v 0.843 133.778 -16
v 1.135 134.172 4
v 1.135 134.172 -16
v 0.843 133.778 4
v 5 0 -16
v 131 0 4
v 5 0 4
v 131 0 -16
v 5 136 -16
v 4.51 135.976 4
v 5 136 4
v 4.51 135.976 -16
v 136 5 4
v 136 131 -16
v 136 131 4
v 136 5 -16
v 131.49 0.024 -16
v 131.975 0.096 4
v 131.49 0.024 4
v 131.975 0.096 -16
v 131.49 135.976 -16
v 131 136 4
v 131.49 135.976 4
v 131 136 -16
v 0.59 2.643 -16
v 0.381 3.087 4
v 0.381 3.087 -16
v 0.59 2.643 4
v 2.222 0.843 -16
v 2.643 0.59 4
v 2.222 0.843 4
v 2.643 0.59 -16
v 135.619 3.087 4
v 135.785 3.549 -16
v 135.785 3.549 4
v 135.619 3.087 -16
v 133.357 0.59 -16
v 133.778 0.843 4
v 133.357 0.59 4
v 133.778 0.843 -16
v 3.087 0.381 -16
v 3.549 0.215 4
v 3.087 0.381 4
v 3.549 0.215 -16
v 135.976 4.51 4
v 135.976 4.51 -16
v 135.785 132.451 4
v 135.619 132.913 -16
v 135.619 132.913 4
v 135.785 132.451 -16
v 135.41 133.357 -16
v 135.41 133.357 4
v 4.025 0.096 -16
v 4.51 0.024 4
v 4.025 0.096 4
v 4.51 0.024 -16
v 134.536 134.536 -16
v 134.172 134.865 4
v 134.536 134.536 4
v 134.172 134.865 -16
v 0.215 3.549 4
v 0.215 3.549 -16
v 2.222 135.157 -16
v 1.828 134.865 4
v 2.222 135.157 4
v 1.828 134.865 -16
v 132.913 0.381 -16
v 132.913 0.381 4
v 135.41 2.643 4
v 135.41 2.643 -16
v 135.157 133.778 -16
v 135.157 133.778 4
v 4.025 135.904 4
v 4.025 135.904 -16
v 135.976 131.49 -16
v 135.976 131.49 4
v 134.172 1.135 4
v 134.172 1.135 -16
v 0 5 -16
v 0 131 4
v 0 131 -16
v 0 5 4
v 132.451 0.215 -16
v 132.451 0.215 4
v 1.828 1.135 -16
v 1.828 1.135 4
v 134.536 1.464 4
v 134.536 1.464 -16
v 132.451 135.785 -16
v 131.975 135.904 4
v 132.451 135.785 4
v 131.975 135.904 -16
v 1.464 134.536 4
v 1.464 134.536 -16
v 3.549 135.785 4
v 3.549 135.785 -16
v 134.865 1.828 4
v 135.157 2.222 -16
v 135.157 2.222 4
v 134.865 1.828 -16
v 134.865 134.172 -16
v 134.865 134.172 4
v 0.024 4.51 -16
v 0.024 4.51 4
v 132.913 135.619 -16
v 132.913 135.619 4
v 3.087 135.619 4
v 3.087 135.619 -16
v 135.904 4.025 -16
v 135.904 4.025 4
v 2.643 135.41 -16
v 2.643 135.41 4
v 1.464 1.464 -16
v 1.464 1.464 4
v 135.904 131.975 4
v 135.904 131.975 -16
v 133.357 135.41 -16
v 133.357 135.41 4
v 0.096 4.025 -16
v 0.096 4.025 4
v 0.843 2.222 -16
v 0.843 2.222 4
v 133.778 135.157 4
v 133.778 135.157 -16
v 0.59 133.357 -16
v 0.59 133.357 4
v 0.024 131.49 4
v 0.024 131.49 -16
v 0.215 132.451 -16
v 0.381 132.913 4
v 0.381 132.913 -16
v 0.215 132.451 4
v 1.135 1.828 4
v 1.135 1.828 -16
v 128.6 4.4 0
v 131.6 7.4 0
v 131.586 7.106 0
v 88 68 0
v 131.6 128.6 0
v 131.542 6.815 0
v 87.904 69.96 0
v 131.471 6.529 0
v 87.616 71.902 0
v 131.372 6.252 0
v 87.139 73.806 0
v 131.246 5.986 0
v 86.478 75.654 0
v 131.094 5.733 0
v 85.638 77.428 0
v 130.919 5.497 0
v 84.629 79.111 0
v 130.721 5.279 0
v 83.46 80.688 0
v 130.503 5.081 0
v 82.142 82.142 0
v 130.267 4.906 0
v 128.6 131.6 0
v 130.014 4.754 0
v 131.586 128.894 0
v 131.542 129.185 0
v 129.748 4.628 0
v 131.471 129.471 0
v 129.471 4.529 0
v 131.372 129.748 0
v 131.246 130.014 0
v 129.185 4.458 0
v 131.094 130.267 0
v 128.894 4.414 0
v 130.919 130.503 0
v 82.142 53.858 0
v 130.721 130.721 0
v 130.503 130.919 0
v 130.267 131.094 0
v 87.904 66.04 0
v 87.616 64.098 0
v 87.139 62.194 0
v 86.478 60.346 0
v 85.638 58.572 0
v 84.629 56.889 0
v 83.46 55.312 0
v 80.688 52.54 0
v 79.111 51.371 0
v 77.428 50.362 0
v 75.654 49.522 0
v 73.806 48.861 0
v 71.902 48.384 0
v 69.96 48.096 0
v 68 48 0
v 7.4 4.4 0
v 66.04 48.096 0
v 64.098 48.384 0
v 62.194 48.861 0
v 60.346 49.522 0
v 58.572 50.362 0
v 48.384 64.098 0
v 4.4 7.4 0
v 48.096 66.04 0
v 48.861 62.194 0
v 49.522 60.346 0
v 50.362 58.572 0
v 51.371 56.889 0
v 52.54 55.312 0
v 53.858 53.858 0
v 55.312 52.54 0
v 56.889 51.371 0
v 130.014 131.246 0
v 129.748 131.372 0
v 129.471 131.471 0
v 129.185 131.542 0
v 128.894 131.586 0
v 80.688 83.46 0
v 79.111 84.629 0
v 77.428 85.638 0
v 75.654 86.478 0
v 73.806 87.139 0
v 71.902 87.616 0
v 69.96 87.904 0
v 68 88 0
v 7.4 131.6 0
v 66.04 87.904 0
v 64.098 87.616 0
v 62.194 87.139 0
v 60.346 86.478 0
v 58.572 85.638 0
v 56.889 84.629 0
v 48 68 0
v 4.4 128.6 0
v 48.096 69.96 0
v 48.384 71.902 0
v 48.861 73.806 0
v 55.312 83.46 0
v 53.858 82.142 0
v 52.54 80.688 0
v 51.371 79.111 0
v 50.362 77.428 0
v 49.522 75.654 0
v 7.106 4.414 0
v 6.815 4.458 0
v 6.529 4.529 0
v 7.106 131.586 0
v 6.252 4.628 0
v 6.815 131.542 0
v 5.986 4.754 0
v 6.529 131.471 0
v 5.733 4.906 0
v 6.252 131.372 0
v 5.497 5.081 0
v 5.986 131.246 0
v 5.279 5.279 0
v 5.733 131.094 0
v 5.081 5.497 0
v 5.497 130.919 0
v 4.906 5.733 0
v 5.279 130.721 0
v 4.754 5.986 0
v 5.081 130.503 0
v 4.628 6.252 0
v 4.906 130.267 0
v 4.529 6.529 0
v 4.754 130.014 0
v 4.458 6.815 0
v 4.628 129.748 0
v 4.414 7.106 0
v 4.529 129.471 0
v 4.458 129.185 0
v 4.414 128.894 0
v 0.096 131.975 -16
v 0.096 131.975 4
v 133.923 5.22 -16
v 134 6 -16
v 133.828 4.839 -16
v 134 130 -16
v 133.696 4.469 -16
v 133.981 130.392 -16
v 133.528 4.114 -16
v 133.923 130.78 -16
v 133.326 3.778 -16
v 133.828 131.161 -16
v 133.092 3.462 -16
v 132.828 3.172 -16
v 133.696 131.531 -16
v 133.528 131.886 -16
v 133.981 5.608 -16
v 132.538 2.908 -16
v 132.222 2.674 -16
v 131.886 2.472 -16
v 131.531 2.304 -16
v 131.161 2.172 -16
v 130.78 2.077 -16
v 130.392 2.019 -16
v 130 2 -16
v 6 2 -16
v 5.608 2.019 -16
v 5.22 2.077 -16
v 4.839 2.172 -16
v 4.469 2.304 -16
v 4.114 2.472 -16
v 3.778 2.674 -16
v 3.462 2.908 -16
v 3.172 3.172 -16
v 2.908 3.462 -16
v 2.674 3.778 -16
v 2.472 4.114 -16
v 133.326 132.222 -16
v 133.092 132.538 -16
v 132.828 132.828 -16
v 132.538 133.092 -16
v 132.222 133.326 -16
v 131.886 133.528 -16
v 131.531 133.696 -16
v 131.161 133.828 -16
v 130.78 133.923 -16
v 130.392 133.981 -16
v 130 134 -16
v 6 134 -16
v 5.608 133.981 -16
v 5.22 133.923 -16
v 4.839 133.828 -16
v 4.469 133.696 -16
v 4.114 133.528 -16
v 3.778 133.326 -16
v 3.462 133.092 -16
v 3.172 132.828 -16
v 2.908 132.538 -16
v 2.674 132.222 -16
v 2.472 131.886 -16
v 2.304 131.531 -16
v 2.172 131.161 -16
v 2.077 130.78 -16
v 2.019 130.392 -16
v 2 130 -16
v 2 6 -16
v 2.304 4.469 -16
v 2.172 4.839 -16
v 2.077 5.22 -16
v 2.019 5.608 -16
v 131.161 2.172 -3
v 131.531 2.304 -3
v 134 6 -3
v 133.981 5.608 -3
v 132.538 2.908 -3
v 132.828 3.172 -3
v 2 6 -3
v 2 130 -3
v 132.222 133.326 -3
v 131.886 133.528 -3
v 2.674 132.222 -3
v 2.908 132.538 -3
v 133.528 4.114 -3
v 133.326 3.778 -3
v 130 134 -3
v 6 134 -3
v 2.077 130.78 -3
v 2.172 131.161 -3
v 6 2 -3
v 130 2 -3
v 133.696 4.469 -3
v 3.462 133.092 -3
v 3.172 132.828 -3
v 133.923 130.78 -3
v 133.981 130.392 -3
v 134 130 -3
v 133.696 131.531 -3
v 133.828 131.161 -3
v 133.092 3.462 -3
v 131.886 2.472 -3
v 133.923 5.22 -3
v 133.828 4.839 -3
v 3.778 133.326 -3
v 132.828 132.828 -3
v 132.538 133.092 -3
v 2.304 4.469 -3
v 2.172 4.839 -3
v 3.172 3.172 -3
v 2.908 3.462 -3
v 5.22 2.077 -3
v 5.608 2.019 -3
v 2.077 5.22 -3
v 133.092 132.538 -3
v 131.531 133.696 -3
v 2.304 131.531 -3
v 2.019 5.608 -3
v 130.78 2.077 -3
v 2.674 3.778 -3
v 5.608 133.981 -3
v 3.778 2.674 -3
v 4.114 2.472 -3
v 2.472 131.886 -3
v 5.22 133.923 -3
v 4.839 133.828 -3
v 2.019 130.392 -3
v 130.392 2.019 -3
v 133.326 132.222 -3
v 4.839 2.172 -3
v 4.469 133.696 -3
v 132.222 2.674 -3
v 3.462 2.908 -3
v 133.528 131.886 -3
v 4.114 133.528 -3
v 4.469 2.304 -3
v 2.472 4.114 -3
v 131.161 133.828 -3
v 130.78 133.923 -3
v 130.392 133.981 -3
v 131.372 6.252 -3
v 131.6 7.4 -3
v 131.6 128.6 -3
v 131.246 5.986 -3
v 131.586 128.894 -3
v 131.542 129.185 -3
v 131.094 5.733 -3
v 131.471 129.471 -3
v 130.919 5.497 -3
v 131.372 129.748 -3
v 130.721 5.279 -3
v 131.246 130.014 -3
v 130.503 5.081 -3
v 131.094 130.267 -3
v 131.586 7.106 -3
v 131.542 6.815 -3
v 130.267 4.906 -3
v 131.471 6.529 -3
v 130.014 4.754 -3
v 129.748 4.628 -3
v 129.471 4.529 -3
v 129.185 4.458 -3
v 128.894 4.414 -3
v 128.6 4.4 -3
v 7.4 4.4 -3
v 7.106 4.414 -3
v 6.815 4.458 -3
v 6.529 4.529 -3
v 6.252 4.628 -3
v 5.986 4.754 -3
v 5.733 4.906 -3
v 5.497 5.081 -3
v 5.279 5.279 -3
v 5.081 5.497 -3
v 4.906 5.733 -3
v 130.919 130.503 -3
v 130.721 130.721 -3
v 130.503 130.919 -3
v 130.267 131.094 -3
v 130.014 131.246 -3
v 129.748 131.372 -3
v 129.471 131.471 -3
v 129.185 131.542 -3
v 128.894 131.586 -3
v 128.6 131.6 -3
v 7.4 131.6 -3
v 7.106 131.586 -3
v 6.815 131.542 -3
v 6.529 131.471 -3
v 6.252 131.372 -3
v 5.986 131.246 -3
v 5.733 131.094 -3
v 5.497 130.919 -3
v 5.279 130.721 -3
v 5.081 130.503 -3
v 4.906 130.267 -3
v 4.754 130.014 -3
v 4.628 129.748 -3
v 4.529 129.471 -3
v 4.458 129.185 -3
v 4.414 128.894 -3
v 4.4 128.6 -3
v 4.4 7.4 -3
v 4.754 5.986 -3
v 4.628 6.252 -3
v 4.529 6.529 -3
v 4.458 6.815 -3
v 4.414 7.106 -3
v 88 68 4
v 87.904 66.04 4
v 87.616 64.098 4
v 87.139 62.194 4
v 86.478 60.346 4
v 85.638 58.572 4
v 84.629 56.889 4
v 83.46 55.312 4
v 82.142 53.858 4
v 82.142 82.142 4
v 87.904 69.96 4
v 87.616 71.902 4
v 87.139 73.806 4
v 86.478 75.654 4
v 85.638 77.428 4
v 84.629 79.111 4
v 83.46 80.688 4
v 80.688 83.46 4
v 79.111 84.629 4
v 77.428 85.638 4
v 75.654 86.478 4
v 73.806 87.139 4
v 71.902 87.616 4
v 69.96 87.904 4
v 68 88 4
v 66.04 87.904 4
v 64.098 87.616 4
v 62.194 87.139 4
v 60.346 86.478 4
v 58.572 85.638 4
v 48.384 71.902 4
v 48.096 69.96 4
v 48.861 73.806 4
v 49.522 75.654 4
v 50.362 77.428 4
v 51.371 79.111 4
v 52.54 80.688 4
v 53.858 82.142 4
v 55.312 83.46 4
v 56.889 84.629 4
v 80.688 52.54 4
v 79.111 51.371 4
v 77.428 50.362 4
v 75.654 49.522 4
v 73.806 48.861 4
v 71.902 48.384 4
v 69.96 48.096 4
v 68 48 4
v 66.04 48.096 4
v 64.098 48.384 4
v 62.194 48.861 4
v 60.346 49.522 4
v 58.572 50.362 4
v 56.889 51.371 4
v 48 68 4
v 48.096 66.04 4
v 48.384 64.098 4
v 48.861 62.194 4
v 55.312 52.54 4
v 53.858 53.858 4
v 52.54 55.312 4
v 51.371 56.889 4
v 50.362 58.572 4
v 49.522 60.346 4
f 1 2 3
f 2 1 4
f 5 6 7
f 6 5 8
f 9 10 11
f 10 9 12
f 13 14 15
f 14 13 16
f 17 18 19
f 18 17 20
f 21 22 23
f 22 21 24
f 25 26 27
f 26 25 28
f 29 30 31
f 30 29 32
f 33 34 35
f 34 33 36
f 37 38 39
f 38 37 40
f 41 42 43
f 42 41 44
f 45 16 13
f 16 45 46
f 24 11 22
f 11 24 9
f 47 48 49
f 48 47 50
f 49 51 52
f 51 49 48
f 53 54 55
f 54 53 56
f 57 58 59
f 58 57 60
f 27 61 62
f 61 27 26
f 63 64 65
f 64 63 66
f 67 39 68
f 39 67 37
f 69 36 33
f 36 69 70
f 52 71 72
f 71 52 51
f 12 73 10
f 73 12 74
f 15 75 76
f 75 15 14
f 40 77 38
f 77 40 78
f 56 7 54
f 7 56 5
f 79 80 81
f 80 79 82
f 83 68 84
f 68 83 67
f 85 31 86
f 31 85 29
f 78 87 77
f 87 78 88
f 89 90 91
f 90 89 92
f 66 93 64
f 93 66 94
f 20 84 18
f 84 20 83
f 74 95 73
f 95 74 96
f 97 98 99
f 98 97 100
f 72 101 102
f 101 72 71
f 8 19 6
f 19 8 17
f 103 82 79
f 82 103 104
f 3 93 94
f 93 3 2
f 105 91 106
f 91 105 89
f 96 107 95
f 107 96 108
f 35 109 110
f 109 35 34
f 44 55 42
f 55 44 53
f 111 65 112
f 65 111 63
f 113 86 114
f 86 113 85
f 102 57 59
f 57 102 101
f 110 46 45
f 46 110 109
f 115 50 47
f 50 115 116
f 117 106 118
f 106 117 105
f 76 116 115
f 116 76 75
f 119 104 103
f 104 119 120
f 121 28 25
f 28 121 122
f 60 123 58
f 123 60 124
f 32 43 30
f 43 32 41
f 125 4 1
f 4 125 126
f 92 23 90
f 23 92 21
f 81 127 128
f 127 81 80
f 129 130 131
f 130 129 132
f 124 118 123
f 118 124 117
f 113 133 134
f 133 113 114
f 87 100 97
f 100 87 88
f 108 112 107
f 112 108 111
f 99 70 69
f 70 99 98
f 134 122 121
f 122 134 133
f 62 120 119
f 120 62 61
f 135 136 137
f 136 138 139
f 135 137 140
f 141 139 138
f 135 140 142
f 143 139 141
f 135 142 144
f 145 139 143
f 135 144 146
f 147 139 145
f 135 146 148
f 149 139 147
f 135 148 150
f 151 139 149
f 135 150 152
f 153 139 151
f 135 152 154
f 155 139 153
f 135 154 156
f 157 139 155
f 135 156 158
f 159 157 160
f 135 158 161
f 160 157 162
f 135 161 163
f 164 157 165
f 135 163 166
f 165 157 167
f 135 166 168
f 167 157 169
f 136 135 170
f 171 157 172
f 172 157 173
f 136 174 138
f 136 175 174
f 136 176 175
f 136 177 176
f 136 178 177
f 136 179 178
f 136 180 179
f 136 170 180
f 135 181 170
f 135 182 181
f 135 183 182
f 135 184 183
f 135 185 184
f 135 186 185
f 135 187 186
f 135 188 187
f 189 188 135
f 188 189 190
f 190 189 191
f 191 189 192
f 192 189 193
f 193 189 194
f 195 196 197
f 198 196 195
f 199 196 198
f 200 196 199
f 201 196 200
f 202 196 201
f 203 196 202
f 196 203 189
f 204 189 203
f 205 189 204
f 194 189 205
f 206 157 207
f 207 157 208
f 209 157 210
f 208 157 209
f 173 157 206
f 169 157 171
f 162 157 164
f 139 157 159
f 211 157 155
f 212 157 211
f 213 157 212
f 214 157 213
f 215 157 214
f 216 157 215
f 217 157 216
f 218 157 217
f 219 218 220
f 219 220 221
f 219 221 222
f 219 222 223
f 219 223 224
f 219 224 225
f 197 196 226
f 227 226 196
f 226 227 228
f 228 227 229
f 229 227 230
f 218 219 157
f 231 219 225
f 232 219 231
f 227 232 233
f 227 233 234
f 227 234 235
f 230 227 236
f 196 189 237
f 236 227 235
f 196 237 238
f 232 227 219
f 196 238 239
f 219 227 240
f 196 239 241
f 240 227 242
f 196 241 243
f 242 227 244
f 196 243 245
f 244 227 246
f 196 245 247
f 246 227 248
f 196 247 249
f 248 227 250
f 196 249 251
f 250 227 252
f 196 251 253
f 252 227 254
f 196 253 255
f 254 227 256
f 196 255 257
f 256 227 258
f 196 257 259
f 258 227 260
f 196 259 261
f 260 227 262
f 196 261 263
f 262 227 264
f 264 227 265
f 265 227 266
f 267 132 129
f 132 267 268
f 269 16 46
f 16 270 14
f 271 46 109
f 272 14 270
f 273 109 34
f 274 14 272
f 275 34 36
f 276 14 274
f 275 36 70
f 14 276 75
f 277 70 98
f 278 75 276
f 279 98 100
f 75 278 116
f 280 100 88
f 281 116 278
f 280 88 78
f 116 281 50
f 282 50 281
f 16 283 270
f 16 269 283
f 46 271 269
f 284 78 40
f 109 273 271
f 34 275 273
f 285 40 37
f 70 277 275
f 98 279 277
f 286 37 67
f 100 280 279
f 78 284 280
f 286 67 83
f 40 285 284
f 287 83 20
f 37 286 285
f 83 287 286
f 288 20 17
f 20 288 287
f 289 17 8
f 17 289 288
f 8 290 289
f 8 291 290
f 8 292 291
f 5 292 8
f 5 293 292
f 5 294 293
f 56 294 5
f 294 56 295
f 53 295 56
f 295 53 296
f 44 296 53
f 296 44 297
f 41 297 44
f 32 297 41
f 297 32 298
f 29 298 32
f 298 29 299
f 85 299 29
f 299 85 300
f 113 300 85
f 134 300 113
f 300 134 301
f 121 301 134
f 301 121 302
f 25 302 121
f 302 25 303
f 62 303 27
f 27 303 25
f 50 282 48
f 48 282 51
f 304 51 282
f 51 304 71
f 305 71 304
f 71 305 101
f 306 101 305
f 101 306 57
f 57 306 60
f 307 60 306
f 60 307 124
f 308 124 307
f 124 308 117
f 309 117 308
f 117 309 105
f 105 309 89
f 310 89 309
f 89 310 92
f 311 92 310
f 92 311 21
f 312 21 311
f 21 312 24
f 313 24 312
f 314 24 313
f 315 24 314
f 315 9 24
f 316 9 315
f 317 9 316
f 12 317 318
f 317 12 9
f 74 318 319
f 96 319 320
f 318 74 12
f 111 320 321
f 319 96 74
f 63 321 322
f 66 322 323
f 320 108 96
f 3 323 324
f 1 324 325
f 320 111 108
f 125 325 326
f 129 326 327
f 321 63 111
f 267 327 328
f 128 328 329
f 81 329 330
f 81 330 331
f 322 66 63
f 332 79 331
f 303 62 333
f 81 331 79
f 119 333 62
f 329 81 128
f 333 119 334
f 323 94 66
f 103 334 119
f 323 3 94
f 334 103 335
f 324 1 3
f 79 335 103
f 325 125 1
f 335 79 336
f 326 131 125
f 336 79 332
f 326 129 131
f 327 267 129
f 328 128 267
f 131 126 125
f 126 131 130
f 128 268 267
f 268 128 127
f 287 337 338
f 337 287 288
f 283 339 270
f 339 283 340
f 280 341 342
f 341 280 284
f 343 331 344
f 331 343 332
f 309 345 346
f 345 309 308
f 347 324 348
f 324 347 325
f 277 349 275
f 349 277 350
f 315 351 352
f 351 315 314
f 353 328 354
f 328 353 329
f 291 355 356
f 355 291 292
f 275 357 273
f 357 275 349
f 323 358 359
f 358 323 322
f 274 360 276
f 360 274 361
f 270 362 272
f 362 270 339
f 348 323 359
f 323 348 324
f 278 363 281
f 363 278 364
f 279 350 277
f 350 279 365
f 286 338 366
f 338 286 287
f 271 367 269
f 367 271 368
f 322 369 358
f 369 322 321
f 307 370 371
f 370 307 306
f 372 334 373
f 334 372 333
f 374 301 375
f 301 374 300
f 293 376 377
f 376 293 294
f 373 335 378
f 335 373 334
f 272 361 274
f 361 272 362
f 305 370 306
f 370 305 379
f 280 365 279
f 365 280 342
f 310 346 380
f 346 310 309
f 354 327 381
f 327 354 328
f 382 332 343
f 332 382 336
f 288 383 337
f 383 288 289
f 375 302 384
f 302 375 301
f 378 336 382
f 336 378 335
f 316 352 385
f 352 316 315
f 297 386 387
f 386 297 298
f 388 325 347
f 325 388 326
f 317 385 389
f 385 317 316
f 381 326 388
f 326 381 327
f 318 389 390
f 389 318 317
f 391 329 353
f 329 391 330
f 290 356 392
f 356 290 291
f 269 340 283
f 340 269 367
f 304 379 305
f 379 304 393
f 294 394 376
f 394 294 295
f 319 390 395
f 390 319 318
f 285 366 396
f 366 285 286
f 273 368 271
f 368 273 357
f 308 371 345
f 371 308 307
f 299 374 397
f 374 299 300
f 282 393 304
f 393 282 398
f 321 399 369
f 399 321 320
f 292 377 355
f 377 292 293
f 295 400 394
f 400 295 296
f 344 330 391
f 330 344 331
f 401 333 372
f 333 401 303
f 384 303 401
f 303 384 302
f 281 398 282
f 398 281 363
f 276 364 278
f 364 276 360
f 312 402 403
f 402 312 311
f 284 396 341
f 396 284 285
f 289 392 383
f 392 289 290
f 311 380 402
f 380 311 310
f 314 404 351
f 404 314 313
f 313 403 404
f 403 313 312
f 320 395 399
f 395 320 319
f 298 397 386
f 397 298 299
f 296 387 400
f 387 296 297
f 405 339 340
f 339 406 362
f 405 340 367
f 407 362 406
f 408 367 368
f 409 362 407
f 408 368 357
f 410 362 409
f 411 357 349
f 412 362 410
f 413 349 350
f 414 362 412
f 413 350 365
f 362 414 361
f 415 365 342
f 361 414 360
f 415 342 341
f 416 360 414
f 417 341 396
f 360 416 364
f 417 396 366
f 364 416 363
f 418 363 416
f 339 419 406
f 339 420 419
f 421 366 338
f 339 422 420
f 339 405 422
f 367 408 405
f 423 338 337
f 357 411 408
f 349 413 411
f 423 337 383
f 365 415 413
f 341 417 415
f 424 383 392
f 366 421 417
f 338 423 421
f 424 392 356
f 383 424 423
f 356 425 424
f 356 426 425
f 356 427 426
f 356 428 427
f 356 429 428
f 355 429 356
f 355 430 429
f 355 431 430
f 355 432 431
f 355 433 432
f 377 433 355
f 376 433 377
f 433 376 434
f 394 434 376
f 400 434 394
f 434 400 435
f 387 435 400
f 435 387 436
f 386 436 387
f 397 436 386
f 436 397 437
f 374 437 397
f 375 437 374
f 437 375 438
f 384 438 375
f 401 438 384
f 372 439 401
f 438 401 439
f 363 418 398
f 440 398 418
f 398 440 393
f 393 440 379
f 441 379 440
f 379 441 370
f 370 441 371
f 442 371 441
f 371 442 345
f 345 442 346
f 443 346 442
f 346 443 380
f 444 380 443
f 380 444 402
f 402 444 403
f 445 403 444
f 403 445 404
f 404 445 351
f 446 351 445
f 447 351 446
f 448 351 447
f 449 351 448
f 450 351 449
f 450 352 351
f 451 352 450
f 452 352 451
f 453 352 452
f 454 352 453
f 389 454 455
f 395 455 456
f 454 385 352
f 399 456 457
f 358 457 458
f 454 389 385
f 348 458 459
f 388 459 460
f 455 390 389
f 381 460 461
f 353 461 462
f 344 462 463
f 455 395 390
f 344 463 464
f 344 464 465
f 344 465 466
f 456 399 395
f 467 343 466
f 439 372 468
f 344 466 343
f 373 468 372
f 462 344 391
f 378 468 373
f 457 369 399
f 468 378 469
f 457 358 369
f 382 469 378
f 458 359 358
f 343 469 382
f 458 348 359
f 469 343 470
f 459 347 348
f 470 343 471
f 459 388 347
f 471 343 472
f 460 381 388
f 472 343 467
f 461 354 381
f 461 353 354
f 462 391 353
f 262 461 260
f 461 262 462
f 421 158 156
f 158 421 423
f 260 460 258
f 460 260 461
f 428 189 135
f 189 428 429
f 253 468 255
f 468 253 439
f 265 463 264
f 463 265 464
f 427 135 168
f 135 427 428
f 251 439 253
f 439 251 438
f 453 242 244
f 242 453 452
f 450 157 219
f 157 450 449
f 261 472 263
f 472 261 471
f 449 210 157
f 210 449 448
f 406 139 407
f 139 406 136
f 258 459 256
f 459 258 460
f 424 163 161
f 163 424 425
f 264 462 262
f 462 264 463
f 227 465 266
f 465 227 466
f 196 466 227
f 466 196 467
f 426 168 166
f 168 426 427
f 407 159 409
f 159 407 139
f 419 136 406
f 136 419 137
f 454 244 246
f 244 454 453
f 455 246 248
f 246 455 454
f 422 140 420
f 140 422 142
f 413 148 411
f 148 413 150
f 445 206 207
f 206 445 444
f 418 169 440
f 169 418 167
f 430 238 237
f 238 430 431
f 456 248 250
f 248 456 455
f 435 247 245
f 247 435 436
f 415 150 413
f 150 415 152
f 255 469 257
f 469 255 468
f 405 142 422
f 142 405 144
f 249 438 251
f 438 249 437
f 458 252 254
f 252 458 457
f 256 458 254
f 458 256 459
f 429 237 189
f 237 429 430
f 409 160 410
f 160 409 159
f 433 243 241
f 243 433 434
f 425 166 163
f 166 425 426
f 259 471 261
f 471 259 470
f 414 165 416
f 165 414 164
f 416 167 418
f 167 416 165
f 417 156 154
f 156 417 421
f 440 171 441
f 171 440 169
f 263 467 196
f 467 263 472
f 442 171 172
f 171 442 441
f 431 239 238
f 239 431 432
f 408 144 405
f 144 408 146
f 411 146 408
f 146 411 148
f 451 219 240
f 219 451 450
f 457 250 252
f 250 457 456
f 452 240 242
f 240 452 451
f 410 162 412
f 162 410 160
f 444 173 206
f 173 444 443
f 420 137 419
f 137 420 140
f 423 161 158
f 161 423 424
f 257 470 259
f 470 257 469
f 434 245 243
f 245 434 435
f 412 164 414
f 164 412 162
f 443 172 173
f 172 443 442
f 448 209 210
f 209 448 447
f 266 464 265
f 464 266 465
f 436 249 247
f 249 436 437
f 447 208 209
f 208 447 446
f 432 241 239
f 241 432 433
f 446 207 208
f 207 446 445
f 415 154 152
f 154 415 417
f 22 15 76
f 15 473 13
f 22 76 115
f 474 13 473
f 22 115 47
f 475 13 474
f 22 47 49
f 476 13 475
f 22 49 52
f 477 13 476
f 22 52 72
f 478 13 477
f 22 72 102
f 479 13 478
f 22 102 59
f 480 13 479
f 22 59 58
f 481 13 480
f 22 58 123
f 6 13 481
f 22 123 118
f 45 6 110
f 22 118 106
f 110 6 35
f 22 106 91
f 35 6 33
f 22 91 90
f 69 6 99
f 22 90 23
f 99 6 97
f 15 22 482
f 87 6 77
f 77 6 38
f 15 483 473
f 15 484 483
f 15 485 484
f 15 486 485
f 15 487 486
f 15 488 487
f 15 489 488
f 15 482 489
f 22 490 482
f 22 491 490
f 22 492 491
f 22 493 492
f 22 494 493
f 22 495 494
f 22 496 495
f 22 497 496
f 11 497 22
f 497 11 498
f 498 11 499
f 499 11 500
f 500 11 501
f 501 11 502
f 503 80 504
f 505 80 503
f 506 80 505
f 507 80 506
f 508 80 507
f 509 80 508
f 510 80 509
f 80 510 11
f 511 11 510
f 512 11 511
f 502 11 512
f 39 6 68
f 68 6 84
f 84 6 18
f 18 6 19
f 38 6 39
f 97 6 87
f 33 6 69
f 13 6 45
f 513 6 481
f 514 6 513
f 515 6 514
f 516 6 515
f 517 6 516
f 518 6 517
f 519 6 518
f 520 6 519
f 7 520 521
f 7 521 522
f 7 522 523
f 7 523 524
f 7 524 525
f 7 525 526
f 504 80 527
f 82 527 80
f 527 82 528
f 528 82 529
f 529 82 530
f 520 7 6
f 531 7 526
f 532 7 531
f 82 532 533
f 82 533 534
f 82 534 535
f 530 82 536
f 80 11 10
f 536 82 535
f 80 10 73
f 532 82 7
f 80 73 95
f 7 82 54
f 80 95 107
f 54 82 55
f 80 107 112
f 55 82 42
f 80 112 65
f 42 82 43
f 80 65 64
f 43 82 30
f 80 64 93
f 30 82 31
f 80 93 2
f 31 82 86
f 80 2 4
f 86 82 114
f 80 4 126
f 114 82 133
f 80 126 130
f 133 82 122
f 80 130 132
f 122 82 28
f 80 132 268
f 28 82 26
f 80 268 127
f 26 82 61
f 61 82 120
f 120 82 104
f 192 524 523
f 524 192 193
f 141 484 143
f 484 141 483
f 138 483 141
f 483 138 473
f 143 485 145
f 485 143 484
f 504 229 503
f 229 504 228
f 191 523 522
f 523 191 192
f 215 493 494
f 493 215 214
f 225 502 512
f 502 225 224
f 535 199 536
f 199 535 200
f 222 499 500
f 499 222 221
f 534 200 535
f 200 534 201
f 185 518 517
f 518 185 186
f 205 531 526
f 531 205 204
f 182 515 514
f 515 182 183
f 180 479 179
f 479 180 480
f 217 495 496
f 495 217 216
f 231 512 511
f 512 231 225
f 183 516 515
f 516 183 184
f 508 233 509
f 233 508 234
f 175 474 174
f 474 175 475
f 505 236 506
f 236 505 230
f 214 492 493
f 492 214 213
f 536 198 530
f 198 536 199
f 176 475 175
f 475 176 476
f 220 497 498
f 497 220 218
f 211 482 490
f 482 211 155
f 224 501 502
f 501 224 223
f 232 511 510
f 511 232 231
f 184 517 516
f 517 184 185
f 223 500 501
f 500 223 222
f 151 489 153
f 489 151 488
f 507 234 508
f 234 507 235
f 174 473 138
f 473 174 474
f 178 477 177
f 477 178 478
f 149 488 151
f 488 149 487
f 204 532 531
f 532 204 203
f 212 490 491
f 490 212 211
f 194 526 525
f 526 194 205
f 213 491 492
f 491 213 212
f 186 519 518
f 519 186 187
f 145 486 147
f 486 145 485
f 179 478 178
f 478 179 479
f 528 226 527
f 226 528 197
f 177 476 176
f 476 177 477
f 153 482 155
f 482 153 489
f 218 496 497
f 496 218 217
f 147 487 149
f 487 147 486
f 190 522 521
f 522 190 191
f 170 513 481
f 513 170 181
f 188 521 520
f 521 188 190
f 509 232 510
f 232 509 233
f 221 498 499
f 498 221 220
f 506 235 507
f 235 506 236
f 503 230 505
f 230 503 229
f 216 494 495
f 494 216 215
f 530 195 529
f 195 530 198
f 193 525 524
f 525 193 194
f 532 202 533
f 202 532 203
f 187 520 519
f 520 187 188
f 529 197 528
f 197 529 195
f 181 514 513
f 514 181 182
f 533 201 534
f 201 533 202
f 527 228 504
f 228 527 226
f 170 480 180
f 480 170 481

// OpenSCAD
// file: params.scad
// Cat Feeder 5000 — Shared Parameters & Common Modules
// Include this file first in all part files: include <params.scad>

// ===== DIMENSIONS =====
WALL = 3;                // Standard wall thickness (mm)
THIN_WALL = 2.5;         // Thin walls (antenna arch, etc.)
FLOOR = 4;               // Base floor thickness
INSERT_BORE = 4.7;       // M3 heat-set insert pocket bore
M3_CLEAR = 3.4;          // M3 clearance hole
UNIT_W = 160;            // Main body width
UNIT_D = 240;            // Main body depth
UNIT_H = 160;            // Main body height
GATE_W = 118;            // Gate flap width
GATE_H = 90;             // Gate flap height
GATE_T = 3;              // Gate flap thickness
GATE_ROD_D = 3.2;        // Gate hinge rod diameter
ARCH_SPAN = 160;         // Antenna arch left-to-right span
ARCH_H = 70;             // Antenna arch height
ARCH_D = 40;             // Antenna arch depth (front-to-back)
COIL_CH_W = 16;          // Coil channel width
COIL_CH_D = 5;           // Coil channel depth
SERVO_W = 23;            // SG90 servo width
SERVO_D = 12.5;          // SG90 servo depth
SERVO_H = 30;            // SG90 servo height
SERVO_EAR_SPAN = 28;     // SG90 servo ear spacing
TOLERANCE = 0.1;         // General fit tolerance

// ===== RENDER QUALITY =====
$fn = 64;                // Circle resolution (smooth curves)

// ===== COLORS =====
COL_RFID = [0.8, 0.2, 0.2, 0.8];      // Red — RFID antenna arch
COL_TPU = [0.4, 0.7, 0.3, 0.8];       // Green — TPU flexible parts
COL_GATE = [0.2, 0.5, 0.8, 0.8];      // Blue — Gate mechanism
COL_BODY = [0.6, 0.6, 0.6, 0.8];      // Gray — Main body structure

// ===== COMMON MODULES =====

// M3 heat-set insert pocket (bore hole for pressed insert)
module m3_insert(h = 8) {
    cylinder(d = INSERT_BORE, h = h);
}

// M3 clearance hole (for bolt pass-through)
module m3_clear(h = 8) {
    cylinder(d = M3_CLEAR, h = h);
}

// Fillet box: rectangular box with filleted corners
// w, d, h = width, depth, height; r = corner radius
module fillet_box(w, d, h, r = 2) {
    hull() {
        translate([r, r, 0])
            cylinder(r = r, h = h);
        translate([w - r, r, 0])
            cylinder(r = r, h = h);
        translate([r, d - r, 0])
            cylinder(r = r, h = h);
        translate([w - r, d - r, 0])
            cylinder(r = r, h = h);
    }
}

// Boss: raised circular pad with M3 pocket
// Useful for internal reinforcement at bolt points
module boss(d = 10, h = 4, pocket = true) {
    difference() {
        cylinder(d = d, h = h);
        if (pocket)
            translate([0, 0, -0.1])
                m3_clear(h = h + 0.2);
    }
}
// main file
// Cat Feeder 5000 — Part 03: Hopper Lid
// Snap-on lid to keep food fresh.
// Print: PETG, 0.2mm layers, 20% infill, no supports

include <params.scad>

color(COL_BODY) hopper_lid();

module hopper_lid() {
    LID_W = 136; LID_D = 136; LID_H = 20;
    LIP_W = 130; LIP_D = 130;
    SNAP_T = 2; SNAP_H = 3;
    PORT_D = 40;

    difference() {
        union() {
            // Top plate
            fillet_box(LID_W, LID_D, 4, r=5);
            // Skirt with snap lip
            translate([0, 0, -LID_H + 4])
                difference() {
                    fillet_box(LID_W, LID_D, LID_H - 4, r=5);
                    translate([SNAP_T, SNAP_T, -0.1])
                        fillet_box(LID_W - 2*SNAP_T, LID_D - 2*SNAP_T, LID_H, r=4);
                }
            // Snap bead (inner lip, 0.4mm interference at snap point)
            translate([SNAP_T, SNAP_T, -3])
                difference() {
                    fillet_box(LID_W - 2*SNAP_T, LID_D - 2*SNAP_T, SNAP_H, r=4);
                    translate([SNAP_T + 0.4, SNAP_T + 0.4, -0.1])
                        fillet_box(LID_W - 4*SNAP_T - 0.8, LID_D - 4*SNAP_T - 0.8, SNAP_H + 0.2, r=3);
                }
        }
        // Optional center fill port
        translate([LID_W/2, LID_D/2, -0.1])
            cylinder(d=PORT_D, h=5);
        // Vent slots under rim
        for (i = [0:3])
            rotate([0, 0, i*90])
                translate([LID_W/2 - 0.5, LID_D/4, -LID_H + 3])
                    cube([1, 10, 4]);
    }

    // Fill port plug (print separately, optional)
    // translate([LID_W/2, LID_D/2, 5]) port_plug(PORT_D);
}
